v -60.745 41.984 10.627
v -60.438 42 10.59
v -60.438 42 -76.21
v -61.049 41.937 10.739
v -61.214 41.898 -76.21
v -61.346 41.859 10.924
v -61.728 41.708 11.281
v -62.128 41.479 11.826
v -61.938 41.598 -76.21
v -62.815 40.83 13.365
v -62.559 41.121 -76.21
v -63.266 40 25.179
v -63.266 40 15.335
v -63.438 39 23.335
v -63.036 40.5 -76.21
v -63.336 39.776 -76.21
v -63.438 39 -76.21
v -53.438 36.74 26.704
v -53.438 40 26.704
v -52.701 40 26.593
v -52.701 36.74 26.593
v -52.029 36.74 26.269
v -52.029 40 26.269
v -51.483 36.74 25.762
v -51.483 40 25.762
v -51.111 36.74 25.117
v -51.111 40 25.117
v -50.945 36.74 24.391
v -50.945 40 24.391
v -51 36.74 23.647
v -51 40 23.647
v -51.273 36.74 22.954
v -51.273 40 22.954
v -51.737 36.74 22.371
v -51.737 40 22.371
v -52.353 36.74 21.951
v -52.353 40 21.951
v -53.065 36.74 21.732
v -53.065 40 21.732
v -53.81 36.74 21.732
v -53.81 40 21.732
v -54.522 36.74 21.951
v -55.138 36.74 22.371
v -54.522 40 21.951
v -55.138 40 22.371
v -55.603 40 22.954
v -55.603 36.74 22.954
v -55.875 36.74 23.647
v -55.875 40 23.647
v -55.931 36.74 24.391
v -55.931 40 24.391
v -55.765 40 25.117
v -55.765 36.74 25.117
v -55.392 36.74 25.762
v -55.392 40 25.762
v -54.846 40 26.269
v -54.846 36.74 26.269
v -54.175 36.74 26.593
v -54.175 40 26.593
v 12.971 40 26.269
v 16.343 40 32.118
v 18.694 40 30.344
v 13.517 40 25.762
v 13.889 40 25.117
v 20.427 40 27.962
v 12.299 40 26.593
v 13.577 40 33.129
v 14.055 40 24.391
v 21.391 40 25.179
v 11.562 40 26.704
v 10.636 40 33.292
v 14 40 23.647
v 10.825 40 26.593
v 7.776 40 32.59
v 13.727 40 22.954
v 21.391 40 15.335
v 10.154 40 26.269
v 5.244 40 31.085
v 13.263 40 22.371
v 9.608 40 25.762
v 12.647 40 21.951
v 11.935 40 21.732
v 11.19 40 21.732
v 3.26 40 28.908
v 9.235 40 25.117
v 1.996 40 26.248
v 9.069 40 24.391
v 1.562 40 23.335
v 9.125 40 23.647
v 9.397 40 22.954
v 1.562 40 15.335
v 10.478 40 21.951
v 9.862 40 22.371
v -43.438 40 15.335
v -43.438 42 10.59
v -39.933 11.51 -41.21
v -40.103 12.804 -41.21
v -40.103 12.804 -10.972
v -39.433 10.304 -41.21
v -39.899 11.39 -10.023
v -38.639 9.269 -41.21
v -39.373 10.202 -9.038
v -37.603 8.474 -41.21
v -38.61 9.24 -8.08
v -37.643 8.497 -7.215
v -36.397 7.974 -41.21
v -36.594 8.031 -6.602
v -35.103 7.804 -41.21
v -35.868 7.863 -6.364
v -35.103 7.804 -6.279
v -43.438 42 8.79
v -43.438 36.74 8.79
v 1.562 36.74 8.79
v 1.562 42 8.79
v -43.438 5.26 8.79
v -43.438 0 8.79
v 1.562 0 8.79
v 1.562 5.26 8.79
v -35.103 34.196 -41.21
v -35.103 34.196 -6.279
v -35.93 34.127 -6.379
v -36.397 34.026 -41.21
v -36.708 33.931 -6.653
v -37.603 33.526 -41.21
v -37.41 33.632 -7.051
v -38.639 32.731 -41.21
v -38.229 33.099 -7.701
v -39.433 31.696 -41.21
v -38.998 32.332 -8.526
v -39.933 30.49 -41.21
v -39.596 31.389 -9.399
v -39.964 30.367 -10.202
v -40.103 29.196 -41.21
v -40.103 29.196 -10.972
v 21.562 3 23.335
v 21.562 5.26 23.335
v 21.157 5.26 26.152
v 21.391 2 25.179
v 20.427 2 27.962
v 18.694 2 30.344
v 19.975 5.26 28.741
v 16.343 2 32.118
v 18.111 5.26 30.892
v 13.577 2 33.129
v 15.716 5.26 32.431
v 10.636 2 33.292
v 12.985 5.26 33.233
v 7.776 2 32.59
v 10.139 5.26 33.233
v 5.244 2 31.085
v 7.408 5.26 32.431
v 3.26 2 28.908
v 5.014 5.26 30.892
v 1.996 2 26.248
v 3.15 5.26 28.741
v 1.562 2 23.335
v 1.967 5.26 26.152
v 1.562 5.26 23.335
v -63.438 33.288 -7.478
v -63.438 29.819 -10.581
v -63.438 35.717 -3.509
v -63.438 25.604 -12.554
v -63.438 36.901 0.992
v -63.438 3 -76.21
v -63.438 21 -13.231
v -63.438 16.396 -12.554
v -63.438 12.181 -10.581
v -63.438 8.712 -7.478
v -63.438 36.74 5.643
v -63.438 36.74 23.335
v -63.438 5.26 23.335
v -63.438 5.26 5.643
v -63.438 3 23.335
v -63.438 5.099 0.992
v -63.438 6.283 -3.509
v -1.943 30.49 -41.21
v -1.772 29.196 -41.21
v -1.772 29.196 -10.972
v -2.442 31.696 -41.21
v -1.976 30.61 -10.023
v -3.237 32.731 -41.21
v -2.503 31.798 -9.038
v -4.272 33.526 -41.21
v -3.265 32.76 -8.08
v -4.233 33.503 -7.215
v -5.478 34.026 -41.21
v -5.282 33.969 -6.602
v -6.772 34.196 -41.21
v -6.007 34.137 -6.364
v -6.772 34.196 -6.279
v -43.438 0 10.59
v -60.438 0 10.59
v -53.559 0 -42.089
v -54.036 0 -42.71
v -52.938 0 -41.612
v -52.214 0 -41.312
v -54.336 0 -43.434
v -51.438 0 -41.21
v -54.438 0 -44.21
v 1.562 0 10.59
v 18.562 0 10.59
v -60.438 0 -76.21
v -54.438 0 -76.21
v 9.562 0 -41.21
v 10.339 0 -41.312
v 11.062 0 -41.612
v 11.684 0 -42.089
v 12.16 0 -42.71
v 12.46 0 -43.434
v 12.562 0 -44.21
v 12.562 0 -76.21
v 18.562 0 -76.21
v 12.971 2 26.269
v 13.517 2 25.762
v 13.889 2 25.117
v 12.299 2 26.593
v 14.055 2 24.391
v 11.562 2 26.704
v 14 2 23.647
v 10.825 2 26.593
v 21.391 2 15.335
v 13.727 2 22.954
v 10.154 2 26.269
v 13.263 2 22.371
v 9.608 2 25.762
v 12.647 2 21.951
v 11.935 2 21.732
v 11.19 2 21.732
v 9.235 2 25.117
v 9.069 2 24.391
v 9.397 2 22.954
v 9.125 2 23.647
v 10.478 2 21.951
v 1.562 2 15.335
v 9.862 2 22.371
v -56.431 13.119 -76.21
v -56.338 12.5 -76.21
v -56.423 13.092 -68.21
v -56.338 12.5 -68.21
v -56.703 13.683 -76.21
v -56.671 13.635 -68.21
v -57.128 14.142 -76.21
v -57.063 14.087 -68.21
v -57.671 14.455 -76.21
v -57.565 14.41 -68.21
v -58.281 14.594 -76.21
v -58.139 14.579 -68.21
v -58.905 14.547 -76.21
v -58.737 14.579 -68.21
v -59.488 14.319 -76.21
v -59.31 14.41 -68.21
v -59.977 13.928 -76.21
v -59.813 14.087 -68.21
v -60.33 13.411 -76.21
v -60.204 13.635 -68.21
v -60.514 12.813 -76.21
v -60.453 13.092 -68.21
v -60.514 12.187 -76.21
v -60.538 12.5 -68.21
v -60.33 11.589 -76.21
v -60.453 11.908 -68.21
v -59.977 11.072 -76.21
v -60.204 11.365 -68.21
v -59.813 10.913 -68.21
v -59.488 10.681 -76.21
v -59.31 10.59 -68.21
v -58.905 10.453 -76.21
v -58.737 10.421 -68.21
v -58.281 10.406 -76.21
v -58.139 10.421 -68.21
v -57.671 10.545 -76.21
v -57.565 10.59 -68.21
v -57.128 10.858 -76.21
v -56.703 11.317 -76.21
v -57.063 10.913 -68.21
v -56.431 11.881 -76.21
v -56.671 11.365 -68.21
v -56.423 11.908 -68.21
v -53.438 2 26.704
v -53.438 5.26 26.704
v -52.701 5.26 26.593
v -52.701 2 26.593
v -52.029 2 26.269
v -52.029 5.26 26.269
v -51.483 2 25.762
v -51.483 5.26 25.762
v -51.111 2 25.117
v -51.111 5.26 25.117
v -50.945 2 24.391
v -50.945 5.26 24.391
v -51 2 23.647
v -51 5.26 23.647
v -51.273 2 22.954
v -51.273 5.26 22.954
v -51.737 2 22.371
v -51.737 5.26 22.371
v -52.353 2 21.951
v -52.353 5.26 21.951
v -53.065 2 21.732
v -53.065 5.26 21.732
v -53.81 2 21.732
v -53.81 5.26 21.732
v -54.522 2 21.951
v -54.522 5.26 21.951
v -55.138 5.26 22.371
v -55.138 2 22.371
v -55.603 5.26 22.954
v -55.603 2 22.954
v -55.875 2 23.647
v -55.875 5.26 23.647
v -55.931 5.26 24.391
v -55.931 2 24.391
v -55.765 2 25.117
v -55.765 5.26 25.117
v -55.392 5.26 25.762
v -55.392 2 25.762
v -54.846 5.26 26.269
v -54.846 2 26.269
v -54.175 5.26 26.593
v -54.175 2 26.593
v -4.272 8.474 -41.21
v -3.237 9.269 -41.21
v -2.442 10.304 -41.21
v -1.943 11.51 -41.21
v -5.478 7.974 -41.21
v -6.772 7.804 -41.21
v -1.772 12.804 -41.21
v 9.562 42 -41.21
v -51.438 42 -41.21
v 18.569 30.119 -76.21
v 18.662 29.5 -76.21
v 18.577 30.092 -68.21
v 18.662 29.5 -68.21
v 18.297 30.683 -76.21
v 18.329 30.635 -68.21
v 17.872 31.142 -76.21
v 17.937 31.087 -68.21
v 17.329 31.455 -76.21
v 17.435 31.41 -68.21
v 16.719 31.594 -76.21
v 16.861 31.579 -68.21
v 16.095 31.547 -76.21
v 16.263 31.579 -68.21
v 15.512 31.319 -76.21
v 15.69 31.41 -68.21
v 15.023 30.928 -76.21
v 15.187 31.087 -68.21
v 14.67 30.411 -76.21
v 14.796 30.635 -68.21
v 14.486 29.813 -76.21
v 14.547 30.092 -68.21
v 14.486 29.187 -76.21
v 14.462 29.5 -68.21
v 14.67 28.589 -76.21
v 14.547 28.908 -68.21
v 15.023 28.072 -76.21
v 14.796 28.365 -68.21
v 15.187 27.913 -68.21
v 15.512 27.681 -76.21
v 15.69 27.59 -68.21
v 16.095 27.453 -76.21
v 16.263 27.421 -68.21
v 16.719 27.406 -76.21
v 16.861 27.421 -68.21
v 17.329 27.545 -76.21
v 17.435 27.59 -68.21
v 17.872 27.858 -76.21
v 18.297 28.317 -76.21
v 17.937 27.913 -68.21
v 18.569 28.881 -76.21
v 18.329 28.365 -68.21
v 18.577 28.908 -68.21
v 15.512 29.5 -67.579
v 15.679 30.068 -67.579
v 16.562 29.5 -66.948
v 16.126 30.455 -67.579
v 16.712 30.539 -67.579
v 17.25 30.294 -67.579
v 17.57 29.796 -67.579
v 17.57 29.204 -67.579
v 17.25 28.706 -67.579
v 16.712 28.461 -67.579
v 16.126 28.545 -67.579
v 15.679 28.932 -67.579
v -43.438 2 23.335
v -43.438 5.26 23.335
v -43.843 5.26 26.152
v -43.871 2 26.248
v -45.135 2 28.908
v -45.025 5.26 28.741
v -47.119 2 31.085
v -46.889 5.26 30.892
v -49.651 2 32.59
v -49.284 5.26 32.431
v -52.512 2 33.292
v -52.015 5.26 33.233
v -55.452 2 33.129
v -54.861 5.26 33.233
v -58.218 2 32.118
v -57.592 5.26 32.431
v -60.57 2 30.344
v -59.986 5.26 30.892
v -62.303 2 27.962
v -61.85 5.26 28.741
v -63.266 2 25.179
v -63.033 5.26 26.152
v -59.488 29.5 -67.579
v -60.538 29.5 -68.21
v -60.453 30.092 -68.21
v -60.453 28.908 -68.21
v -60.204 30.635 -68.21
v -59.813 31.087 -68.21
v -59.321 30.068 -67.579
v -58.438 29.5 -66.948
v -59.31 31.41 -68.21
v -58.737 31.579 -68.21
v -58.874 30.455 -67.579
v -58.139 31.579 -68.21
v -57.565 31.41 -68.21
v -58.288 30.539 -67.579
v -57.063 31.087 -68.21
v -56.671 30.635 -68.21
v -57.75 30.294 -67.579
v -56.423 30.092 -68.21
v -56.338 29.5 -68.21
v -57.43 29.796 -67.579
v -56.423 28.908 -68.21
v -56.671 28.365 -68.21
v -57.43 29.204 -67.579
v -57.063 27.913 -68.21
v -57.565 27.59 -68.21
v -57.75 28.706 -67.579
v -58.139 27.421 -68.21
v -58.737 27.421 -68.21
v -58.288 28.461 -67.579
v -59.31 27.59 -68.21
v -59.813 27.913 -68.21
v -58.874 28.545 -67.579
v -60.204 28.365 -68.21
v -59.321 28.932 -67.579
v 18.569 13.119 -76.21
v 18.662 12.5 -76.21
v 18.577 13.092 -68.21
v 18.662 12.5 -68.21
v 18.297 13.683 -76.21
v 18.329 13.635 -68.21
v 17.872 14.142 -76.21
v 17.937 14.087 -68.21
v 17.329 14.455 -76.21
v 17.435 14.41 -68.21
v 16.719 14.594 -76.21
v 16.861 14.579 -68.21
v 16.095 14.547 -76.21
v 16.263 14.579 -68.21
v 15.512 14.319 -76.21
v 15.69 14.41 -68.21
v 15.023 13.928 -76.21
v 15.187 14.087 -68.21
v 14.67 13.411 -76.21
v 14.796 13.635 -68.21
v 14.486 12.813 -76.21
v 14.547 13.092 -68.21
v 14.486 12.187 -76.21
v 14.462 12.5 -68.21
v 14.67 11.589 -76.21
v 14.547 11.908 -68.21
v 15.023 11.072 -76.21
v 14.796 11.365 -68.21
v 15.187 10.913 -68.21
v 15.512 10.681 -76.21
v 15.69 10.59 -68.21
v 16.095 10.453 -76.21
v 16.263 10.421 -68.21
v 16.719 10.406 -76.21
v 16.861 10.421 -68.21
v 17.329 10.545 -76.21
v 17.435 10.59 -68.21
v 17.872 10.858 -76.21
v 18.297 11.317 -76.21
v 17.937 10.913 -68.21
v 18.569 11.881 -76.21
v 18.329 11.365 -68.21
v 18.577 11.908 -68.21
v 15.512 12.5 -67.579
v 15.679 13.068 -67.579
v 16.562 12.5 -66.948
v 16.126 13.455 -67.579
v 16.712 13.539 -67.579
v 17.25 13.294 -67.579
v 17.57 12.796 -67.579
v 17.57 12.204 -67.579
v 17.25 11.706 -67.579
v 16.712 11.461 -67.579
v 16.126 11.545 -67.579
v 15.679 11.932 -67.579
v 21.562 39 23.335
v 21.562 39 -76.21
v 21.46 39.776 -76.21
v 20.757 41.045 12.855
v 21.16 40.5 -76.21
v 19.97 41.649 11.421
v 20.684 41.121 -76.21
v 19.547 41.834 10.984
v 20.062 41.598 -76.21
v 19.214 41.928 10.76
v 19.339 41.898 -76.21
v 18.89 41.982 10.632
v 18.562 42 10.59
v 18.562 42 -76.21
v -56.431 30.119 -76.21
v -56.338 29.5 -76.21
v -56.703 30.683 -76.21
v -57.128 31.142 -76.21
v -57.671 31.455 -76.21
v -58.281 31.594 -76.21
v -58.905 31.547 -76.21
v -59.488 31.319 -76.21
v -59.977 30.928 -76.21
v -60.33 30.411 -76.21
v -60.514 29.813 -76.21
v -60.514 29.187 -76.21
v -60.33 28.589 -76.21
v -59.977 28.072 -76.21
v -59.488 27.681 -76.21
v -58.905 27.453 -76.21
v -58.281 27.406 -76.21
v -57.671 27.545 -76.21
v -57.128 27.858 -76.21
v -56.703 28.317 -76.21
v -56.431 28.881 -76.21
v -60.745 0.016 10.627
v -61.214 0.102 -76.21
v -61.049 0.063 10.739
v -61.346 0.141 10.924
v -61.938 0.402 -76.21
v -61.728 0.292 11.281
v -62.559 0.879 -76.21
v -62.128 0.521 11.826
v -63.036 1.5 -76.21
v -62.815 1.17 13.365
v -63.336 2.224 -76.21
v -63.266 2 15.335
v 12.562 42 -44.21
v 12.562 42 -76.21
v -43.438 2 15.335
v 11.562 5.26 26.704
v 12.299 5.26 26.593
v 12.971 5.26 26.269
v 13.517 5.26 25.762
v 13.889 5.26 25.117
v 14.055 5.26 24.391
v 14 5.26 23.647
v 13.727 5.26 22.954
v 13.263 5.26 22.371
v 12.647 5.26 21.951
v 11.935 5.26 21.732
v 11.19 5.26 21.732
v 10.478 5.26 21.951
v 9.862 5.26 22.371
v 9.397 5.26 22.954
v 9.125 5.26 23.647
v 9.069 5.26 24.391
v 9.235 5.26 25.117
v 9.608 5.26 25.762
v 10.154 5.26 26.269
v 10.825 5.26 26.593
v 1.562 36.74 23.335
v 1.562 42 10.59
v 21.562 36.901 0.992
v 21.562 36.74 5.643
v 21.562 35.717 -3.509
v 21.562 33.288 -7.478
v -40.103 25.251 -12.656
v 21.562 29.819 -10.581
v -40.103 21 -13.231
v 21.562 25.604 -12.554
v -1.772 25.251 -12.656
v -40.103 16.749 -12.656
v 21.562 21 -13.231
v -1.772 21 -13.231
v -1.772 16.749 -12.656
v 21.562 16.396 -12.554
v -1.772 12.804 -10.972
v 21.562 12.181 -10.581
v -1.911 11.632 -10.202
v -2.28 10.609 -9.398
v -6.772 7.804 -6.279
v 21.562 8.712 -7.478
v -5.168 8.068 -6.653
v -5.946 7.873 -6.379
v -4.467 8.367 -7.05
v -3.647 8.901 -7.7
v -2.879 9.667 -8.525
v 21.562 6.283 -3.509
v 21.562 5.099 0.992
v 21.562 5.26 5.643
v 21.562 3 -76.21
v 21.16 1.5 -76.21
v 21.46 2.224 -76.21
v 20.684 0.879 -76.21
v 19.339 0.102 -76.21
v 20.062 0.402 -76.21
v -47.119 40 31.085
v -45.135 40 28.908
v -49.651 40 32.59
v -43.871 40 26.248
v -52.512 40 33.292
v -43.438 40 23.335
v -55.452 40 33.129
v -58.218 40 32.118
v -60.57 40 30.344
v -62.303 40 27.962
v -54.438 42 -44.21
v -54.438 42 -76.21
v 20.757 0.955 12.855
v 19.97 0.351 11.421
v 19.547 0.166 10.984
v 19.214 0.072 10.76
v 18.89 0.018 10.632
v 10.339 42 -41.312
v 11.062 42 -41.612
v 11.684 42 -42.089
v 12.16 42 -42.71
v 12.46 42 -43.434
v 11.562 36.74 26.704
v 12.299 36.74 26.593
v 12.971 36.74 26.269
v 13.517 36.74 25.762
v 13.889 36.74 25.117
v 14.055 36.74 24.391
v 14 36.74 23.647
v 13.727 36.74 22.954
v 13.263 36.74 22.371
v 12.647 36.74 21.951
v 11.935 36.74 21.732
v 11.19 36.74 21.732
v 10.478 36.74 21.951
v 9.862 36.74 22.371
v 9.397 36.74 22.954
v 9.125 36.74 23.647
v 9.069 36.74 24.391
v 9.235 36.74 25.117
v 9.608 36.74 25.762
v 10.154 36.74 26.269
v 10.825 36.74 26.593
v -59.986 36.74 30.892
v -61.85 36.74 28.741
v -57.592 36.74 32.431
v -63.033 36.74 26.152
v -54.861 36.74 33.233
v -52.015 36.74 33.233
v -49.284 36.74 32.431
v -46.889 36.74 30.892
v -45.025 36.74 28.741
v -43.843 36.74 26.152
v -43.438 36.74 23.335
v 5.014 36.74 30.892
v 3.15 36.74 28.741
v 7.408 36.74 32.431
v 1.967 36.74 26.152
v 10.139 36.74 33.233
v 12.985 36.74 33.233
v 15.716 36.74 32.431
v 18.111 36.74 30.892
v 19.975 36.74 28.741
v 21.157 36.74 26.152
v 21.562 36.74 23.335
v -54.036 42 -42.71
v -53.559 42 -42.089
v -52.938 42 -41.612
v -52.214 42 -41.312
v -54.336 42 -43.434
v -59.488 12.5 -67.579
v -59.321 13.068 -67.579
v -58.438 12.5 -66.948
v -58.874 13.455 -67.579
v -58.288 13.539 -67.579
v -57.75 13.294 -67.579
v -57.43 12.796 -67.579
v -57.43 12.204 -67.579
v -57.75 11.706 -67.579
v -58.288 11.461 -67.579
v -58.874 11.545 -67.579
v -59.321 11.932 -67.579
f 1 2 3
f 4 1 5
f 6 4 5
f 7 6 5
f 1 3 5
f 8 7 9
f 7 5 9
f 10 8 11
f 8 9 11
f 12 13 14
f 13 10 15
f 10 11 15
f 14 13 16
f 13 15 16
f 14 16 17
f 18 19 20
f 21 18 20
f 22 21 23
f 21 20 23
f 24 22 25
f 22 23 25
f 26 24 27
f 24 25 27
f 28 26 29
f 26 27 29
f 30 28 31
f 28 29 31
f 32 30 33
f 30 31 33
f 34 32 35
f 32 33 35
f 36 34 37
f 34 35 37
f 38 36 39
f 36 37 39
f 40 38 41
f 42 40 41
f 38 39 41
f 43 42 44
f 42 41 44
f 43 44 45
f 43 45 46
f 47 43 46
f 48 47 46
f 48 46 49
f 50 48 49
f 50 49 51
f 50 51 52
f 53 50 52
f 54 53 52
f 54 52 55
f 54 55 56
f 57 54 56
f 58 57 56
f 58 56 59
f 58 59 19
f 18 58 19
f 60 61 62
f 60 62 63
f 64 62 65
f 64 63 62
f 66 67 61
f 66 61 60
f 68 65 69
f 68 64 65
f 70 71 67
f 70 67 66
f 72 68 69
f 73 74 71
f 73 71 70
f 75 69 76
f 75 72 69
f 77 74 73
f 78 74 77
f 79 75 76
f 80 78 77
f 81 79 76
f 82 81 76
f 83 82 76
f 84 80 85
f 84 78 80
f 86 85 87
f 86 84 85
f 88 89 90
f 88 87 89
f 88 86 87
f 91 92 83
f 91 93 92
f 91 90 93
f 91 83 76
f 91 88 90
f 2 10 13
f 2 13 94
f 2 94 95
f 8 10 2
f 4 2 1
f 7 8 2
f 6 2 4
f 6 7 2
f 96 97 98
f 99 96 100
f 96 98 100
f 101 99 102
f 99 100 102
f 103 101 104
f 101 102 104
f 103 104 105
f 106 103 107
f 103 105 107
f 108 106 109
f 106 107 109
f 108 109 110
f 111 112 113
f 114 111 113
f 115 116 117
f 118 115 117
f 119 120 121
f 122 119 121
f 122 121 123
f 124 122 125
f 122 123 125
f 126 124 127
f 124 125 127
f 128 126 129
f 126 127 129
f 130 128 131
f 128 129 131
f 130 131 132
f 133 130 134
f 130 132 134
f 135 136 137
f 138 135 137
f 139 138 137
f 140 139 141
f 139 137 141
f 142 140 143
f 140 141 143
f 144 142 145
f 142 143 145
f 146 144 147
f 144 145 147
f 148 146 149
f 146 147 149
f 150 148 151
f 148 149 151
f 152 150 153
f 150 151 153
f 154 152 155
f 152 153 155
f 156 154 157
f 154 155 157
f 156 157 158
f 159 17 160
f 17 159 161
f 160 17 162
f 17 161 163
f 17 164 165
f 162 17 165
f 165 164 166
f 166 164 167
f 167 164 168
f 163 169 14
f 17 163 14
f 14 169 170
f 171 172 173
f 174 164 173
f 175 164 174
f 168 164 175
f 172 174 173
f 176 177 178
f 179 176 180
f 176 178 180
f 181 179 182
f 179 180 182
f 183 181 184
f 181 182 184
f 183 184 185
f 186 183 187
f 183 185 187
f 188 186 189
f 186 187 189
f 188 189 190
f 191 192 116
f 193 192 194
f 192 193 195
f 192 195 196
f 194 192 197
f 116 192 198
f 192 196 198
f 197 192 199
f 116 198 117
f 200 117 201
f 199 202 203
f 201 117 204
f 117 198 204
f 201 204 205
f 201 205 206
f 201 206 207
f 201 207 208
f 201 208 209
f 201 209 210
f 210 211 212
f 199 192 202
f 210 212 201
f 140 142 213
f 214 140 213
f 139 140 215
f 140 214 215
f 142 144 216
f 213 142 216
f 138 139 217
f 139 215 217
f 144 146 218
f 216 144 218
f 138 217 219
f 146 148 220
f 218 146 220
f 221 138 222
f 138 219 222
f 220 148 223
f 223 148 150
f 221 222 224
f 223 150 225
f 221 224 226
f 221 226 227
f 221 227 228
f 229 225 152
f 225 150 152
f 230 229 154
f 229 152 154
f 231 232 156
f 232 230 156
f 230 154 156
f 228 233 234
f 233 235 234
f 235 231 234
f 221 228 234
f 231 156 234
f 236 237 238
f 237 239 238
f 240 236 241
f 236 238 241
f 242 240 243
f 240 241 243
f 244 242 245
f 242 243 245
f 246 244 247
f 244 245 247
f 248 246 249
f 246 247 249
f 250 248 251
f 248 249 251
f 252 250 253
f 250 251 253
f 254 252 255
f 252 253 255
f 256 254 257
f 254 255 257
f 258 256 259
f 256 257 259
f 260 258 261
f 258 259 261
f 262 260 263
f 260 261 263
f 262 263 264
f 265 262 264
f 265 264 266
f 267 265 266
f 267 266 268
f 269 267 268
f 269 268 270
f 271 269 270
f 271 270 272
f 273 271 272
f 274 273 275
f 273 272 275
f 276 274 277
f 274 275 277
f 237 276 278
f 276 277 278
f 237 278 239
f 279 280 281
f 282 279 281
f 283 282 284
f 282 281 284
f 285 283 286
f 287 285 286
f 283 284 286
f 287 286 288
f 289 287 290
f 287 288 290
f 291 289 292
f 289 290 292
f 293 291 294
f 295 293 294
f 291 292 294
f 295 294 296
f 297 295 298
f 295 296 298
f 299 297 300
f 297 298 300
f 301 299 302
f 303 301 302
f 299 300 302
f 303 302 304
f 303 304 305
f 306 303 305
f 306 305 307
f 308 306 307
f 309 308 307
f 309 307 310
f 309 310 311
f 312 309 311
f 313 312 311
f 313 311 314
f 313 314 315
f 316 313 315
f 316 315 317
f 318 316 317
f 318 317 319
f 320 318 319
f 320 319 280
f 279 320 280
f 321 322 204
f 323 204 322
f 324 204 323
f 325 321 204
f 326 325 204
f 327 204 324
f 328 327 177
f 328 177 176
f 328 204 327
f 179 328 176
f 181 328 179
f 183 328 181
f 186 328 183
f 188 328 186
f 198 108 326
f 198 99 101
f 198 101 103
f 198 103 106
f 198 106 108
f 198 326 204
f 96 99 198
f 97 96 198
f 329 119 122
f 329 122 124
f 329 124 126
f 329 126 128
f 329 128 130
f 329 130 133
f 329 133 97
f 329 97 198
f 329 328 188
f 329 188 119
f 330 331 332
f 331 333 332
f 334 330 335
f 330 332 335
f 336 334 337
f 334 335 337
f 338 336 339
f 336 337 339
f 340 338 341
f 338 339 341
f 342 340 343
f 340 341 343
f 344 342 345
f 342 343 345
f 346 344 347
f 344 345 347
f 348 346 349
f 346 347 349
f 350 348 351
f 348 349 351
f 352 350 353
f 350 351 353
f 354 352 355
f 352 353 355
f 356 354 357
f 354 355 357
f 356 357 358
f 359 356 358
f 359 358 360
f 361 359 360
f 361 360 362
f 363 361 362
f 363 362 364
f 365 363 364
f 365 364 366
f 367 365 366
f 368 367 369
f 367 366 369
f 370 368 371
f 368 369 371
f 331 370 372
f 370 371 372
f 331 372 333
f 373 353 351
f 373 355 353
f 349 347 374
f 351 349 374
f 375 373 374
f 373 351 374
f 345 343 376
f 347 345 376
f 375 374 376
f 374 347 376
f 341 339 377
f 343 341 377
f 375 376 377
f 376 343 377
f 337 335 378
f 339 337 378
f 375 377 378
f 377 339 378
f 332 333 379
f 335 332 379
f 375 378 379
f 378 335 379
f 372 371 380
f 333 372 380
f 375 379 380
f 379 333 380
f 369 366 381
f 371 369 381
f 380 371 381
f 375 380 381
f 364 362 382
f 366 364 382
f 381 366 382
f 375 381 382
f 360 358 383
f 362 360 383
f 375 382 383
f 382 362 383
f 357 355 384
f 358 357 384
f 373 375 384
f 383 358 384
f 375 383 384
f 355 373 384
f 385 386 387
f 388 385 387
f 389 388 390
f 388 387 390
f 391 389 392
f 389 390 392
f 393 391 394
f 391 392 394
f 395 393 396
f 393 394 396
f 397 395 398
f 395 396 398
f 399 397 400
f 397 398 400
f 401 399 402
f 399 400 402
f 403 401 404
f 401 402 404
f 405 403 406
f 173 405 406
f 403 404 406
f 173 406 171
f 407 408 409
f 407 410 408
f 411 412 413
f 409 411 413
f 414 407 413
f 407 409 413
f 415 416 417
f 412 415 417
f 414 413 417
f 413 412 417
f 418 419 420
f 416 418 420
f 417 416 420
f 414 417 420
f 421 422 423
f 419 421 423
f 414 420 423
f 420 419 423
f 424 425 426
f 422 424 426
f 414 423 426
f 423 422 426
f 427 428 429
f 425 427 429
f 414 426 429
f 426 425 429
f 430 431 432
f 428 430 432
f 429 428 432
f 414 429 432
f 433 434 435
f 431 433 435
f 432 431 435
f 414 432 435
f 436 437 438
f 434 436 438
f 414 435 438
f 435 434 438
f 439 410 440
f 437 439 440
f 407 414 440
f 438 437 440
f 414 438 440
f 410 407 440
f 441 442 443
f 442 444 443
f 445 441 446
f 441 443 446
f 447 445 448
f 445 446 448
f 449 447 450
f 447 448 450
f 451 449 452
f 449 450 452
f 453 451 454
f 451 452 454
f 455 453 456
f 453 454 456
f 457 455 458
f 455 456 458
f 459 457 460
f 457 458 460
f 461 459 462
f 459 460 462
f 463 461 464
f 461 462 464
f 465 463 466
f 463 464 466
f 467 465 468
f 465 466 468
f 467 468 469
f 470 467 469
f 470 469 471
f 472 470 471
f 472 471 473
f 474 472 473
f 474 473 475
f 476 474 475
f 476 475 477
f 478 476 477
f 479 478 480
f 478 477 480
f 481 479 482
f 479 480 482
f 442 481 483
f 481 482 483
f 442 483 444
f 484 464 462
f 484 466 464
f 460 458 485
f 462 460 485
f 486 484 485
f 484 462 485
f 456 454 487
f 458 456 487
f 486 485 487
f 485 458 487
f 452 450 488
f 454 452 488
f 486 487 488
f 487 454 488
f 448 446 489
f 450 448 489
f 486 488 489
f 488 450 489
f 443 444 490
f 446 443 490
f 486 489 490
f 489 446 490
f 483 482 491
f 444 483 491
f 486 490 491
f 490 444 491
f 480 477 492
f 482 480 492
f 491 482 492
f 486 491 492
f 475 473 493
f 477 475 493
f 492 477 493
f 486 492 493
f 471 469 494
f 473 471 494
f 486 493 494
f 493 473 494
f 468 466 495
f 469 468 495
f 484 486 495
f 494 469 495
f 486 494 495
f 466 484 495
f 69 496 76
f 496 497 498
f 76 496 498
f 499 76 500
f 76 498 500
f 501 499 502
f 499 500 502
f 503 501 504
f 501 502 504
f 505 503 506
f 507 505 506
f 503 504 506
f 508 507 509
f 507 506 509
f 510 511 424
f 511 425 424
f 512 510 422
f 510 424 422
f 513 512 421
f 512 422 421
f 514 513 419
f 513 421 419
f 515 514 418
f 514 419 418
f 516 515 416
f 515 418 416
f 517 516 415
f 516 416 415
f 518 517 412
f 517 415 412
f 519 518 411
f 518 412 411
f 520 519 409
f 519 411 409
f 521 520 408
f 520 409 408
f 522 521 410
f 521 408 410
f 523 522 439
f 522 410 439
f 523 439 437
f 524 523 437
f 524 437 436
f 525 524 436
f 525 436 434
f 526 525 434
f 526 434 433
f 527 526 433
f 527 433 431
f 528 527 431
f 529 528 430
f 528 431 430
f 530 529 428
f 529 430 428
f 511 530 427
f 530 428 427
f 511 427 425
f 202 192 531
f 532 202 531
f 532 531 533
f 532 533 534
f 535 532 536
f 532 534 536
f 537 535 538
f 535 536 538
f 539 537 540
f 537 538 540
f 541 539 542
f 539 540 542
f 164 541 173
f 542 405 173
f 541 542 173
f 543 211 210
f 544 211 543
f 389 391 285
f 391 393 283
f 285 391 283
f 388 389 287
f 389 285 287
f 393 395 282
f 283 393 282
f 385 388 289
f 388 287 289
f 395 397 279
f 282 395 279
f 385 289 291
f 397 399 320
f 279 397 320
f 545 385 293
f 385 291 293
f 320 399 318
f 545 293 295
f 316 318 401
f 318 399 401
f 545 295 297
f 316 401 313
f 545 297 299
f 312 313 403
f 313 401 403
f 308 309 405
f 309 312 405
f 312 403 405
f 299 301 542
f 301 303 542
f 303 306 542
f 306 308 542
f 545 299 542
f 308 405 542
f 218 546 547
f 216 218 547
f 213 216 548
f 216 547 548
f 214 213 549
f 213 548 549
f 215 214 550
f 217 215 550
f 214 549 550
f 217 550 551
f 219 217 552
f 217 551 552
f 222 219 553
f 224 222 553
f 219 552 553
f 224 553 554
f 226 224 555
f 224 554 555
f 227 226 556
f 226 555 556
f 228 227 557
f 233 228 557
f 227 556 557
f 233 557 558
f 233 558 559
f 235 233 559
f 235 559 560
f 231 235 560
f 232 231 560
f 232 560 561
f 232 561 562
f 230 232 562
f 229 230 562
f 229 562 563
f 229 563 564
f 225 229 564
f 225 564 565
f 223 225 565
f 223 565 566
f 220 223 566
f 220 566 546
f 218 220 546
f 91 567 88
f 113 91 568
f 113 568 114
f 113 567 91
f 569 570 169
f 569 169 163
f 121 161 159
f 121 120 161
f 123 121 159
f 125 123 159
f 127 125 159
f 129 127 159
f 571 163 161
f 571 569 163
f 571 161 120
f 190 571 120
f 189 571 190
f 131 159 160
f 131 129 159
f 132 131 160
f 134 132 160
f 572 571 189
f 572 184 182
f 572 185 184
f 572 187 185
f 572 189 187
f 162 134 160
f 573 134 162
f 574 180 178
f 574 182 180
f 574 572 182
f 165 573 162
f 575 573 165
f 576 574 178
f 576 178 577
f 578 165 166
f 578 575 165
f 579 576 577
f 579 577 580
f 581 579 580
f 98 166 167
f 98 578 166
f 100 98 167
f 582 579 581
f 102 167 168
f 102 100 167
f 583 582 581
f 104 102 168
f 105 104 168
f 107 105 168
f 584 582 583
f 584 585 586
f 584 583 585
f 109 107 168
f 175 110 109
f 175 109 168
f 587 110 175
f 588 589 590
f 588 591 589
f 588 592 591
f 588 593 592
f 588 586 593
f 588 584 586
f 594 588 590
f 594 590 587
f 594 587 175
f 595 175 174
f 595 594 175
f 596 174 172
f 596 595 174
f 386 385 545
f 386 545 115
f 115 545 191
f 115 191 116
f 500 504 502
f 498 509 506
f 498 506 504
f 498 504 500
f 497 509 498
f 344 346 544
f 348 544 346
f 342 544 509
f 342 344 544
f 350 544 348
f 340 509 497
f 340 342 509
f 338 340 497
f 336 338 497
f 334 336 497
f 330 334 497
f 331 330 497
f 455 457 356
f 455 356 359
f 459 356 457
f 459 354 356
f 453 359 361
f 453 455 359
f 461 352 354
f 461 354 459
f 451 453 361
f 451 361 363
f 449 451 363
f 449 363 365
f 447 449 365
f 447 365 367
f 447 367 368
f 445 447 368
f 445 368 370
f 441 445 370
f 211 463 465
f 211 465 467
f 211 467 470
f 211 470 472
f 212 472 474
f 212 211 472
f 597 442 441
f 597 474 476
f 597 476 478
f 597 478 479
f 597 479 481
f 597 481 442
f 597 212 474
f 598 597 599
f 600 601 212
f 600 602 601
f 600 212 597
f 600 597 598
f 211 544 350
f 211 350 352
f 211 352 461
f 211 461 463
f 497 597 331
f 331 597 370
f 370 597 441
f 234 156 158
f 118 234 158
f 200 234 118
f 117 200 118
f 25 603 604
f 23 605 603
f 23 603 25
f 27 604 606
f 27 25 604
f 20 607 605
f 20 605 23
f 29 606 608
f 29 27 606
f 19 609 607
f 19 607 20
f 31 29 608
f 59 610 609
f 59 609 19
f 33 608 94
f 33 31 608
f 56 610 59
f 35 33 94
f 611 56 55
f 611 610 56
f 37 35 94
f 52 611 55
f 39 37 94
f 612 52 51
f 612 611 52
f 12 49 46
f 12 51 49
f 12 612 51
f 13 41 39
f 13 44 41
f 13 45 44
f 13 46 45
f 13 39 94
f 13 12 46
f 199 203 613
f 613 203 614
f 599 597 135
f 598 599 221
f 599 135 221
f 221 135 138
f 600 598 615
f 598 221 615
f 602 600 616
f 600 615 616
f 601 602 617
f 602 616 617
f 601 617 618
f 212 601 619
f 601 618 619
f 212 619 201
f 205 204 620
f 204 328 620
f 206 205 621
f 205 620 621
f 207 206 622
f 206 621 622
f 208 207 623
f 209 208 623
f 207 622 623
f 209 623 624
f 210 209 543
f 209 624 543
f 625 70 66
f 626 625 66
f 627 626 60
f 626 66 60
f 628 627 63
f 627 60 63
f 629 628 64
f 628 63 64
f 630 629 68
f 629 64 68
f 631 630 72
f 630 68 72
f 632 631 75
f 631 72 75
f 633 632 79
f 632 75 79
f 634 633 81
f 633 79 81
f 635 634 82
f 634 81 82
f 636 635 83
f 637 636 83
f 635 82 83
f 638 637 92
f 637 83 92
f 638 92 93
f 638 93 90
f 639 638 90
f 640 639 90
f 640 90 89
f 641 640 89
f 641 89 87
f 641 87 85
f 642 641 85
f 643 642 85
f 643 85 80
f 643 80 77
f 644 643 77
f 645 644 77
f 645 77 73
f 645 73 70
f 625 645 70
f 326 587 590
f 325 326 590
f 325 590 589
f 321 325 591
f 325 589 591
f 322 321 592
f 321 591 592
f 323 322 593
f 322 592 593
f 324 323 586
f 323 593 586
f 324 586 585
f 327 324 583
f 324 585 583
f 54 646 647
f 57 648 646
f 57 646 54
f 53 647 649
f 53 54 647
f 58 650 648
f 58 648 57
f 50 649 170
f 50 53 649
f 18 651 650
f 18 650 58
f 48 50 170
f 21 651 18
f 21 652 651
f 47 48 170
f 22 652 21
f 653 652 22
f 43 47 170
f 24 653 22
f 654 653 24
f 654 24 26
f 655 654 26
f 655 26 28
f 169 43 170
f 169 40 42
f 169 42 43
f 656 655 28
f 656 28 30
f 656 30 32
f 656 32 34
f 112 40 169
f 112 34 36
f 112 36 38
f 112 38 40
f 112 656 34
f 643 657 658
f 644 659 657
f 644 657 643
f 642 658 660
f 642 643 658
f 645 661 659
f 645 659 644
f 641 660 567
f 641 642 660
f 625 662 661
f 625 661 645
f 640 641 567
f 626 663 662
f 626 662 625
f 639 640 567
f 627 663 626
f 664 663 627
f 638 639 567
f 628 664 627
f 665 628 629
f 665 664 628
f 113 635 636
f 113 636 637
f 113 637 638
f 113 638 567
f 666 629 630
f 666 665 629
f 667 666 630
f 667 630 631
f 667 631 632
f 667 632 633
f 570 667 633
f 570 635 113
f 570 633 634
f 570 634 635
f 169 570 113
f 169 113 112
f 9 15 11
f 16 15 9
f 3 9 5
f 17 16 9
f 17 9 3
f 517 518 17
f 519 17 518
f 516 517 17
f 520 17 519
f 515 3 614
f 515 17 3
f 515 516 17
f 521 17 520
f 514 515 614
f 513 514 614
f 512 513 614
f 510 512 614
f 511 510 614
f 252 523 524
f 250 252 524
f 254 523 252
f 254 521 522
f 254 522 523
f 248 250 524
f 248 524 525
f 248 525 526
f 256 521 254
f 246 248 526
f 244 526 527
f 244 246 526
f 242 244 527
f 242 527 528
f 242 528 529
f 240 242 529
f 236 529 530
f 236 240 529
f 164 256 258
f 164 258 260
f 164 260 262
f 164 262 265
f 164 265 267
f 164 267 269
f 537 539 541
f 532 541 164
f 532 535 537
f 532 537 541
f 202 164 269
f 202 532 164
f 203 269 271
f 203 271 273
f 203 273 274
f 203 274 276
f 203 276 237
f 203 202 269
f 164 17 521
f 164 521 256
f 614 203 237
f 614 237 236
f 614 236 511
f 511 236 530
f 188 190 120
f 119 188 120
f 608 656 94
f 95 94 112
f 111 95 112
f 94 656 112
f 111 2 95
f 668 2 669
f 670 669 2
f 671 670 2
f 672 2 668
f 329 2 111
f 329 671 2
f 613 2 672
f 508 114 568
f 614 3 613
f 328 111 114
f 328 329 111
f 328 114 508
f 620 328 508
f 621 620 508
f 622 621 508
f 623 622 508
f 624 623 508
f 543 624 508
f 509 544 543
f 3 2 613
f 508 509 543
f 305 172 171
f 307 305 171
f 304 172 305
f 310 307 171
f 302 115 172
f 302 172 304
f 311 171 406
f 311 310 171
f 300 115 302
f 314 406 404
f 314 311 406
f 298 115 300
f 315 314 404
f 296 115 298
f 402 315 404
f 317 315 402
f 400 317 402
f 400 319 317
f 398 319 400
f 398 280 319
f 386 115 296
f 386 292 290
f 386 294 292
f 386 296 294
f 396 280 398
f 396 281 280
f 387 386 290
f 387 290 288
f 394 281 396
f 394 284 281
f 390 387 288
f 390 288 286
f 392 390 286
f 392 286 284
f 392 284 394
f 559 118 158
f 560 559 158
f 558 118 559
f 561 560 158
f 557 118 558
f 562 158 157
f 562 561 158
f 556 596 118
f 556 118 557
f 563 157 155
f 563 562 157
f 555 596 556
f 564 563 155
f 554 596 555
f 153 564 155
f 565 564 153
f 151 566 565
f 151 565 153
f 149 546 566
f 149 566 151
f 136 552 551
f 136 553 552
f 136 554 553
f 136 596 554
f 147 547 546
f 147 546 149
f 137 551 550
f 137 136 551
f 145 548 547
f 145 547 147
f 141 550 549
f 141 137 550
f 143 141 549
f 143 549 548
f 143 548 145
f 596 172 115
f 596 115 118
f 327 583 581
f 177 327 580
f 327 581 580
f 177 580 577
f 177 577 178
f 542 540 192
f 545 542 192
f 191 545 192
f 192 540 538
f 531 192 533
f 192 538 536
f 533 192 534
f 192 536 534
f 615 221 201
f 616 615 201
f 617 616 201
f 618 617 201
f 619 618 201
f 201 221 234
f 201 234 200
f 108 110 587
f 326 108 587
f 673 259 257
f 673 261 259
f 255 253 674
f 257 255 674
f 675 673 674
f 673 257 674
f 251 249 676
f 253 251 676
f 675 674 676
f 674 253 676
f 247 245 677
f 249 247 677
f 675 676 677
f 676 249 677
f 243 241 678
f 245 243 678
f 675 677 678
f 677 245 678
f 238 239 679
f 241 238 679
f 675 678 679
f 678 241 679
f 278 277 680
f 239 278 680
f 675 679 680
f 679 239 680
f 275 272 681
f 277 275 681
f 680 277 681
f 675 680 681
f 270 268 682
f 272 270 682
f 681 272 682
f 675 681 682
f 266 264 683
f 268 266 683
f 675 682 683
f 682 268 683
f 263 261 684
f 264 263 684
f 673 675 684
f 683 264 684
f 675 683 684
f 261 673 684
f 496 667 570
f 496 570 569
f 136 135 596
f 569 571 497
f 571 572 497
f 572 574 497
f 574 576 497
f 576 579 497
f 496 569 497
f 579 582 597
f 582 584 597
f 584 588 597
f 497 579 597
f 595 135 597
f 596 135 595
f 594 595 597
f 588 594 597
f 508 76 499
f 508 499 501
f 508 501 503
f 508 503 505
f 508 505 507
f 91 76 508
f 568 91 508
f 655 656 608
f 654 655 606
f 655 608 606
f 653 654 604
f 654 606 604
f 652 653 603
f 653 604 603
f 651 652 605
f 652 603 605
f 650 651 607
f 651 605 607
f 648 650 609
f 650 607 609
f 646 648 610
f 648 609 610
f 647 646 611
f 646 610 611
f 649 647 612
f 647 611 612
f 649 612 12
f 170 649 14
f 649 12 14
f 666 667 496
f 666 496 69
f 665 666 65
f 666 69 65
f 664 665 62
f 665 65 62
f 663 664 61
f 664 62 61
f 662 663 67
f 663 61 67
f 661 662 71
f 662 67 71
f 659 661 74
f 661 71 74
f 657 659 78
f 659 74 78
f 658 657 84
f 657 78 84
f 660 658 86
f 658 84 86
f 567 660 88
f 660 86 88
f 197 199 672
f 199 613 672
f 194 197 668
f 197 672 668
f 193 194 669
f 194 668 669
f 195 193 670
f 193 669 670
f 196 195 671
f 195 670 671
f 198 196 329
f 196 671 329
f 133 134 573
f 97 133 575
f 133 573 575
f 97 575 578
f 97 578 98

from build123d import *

# Parameters (mm, degrees)
SKETCH1_W               = 85
SKETCH1_H               = 85
SKETCH1_W_2             = 20
SKETCH1_H_2             = 25
BOSS_EXTRUDE1_DEPTH     = 42
CUT_EXTRUDE1_DEPTH      = 108.686284851
CUT_EXTRUDE2_DEPTH      = 122.642881801
CUT_EXTRUDE3_START      = -85
CUT_EXTRUDE3_DEPTH      = 85
SKETCH6_W               = 67
SKETCH6_H               = 42
CUT_EXTRUDE4_DEPTH      = 35
FILLET1_R               = 3
FILLET2_R               = 3
CUT_EXTRUDE6_DEPTH      = 107.514112815
CUT_EXTRUDE6_DEPTH_BACK = 107.514112815
M5_TAPPED_HOLE2_D       = 4.2
M5_TAPPED_HOLE2_DEPTH   = 8
M5_TAPPED_HOLE2_TIP     = 1.2618073
SKETCH17_R              = 2.5
CUT_EXTRUDE7_DEPTH      = 107.922102397


# Read off the part's stored shape, not the designer's step: Cut-Extrude3
with BuildPart() as part:
    # Sketch1 → Boss-Extrude1 (new body)
    with BuildSketch(Plane(origin=(0, 0, 0), x_dir=(1, 0, 0), z_dir=(0, 1, 0))):
        with Locations((-20.937727355, 33.710174471)):
            Rectangle(SKETCH1_W, SKETCH1_H)
        with Locations((-53.437727355, -21.289825529)):
            Rectangle(SKETCH1_W_2, SKETCH1_H_2)
        with Locations((11.562272645, -21.289825529)):
            Rectangle(SKETCH1_W_2, SKETCH1_H_2)
    extrude(amount=BOSS_EXTRUDE1_DEPTH)

    # Sketch2 → Cut-Extrude1 (cut, through all)
    with BuildSketch(Plane(origin=(0, 42, 0), x_dir=(1, 0, 0), z_dir=(0, 1, 0))):
        with BuildLine():
            Line((-63.437727355, -23.334516424), (-63.437727355, -33.789825529))
            Line((-63.437727355, -33.789825529), (-43.437727355, -33.789825529))
            Line((-43.437727355, -33.789825529), (-43.437727355, -23.334516424))
            ThreePointArc((-43.437727355, -23.334516424), (-53.437727355, -33.334516424), (-63.437727355, -23.334516424))
        make_face()
        with BuildLine():
            Line((1.562272645, -23.334516424), (1.562272645, -33.789825529))
            Line((1.562272645, -33.789825529), (21.562272645, -33.789825529))
            Line((21.562272645, -33.789825529), (21.562272645, -23.334516424))
            ThreePointArc((21.562272645, -23.334516424), (11.562272645, -33.334516424), (1.562272645, -23.334516424))
        make_face()
    extrude(amount=-CUT_EXTRUDE1_DEPTH, mode=Mode.SUBTRACT)

    # Sketch3 → Cut-Extrude2 (cut, through all)
    with BuildSketch(Plane.ZY.offset(63.437727355)):
        Polygon((33.334516424, 2), (15.334516424, 2), (10.589618013, 0), (33.334516424, 0), align=None)
        Polygon((15.334516424, 40), (10.589618013, 42), (33.334516424, 42), (33.334516424, 40), align=None)
    extrude(amount=-CUT_EXTRUDE2_DEPTH, mode=Mode.SUBTRACT)

    # Cut-Extrude3 outline → Cut-Extrude3 (cut)
    with BuildSketch(Plane.ZY.offset(63.437727355).offset(CUT_EXTRUDE3_START)):
        with BuildLine():
            Line((33.334516424, 5.260289026), (33.334516424, 36.739710974))
            Line((33.334516424, 36.739710974), (5.643342669, 36.739710974))
            ThreePointArc((5.643342669, 36.739710974), (-13.23093958, 21), (5.643342669, 5.260289026))
            Line((5.643342669, 5.260289026), (33.334516424, 5.260289026))
        make_face()
    extrude(amount=CUT_EXTRUDE3_DEPTH, mode=Mode.SUBTRACT)

    # Sketch6 → Cut-Extrude4 (cut)
    with BuildSketch(Plane(origin=(0, 0, -76.210174471), x_dir=(-1, 0, 0), z_dir=(0, 0, -1))):
        with Locations((20.937727355, 21)):
            Rectangle(SKETCH6_W, SKETCH6_H)
    extrude(amount=-CUT_EXTRUDE4_DEPTH, mode=Mode.SUBTRACT)

    # Fillet1
    # the kernel refuses this fillet: 3 mm, written as the material it takes off along each edge
    with BuildSketch(Plane(origin=(-63.437727355, 42, -94.210174471), x_dir=(1, 0, 0), z_dir=(0, 0, 1)), Plane(origin=(-63.437727355, 0, 28.589618013), x_dir=(1, 0, 0), z_dir=(0, 0, -1)), Plane(origin=(21.562272645, 42, -94.210174471), x_dir=(0, -1, 0), z_dir=(0, 0, 1)), Plane(origin=(21.562272645, 0, 28.589618013), x_dir=(0, 1, 0), z_dir=(0, 0, -1))) as fillet1_piece_1:
        with BuildLine():
            CenterArc((FILLET1_R, -FILLET1_R), FILLET1_R, 90, 90)
            Line((0, -FILLET1_R), (-FILLET1_R * 0.02, -FILLET1_R))
            Line((-FILLET1_R * 0.02, -FILLET1_R), (-FILLET1_R * 0.02, FILLET1_R * 0.02))
            Line((-FILLET1_R * 0.02, FILLET1_R * 0.02), (FILLET1_R, FILLET1_R * 0.02))
            Line((FILLET1_R, FILLET1_R * 0.02), (FILLET1_R, 0))
        make_face()
    extrude(amount=122.799792484, mode=Mode.SUBTRACT)

    # Fillet2
    fillet2_edges = [part.edges().sort_by_distance(p)[0] for p in [
        (12.562272645, 21, -41.210174471),
        (-54.437727355, 21, -41.210174471),
    ]]
    fillet(fillet2_edges, radius=FILLET2_R)

    # Sketch9 → Cut-Extrude6 (cut, two sides: drawn at the far end of the back side and taken through both)
    with BuildSketch(Plane(origin=(0, 0, -41.210174471), x_dir=(-1, 0, 0), z_dir=(0, 0, -1)).offset(-CUT_EXTRUDE6_DEPTH_BACK)):
        with BuildLine():
            Line((35.10328306, 7.804043613), (6.77217165, 7.804043613))
            ThreePointArc((6.77217165, 7.804043613), (3.236637744, 9.268509707), (1.77217165, 12.804043613))
            Line((1.77217165, 12.804043613), (1.77217165, 29.195956387))
            ThreePointArc((1.77217165, 29.195956387), (3.236637744, 32.731490293), (6.77217165, 34.195956387))
            Line((6.77217165, 34.195956387), (35.10328306, 34.195956387))
            ThreePointArc((35.10328306, 34.195956387), (38.638816966, 32.731490293), (40.10328306, 29.195956387))
            Line((40.10328306, 29.195956387), (40.10328306, 12.804043613))
            ThreePointArc((40.10328306, 12.804043613), (38.638816966, 9.268509707), (35.10328306, 7.804043613))
        make_face()
    extrude(amount=CUT_EXTRUDE6_DEPTH + CUT_EXTRUDE6_DEPTH_BACK, mode=Mode.SUBTRACT)

    # M5 Tapped Hole2
    with Locations(Plane(origin=(16.562272645, 29.5, -76.210174471), x_dir=(-1, 0, 0), z_dir=(0, 0, -1))):
        with Locations((0, 0), (0, -17), (75, -17), (75, 0)):
            Hole(M5_TAPPED_HOLE2_D / 2, depth=M5_TAPPED_HOLE2_DEPTH)
            with Locations((0, 0, -(M5_TAPPED_HOLE2_DEPTH + M5_TAPPED_HOLE2_TIP / 2))):  # 118° drill point
                Cone(0, M5_TAPPED_HOLE2_D / 2, M5_TAPPED_HOLE2_TIP, mode=Mode.SUBTRACT)

    # Sketch17 → Cut-Extrude7 (cut, through all)
    with BuildSketch(Plane(origin=(0, 40, 0), x_dir=(1, 0, 0), z_dir=(0, 1, 0))):
        with Locations(Location((-53.437727355, -24.203700837, 0), (0, 0, 270))):
            Circle(SKETCH17_R)
        with Locations(Location((11.562272645, -24.203700837, 0), (0, 0, 270))):
            Circle(SKETCH17_R)
    extrude(amount=-CUT_EXTRUDE7_DEPTH, mode=Mode.SUBTRACT)


solid = part.part
